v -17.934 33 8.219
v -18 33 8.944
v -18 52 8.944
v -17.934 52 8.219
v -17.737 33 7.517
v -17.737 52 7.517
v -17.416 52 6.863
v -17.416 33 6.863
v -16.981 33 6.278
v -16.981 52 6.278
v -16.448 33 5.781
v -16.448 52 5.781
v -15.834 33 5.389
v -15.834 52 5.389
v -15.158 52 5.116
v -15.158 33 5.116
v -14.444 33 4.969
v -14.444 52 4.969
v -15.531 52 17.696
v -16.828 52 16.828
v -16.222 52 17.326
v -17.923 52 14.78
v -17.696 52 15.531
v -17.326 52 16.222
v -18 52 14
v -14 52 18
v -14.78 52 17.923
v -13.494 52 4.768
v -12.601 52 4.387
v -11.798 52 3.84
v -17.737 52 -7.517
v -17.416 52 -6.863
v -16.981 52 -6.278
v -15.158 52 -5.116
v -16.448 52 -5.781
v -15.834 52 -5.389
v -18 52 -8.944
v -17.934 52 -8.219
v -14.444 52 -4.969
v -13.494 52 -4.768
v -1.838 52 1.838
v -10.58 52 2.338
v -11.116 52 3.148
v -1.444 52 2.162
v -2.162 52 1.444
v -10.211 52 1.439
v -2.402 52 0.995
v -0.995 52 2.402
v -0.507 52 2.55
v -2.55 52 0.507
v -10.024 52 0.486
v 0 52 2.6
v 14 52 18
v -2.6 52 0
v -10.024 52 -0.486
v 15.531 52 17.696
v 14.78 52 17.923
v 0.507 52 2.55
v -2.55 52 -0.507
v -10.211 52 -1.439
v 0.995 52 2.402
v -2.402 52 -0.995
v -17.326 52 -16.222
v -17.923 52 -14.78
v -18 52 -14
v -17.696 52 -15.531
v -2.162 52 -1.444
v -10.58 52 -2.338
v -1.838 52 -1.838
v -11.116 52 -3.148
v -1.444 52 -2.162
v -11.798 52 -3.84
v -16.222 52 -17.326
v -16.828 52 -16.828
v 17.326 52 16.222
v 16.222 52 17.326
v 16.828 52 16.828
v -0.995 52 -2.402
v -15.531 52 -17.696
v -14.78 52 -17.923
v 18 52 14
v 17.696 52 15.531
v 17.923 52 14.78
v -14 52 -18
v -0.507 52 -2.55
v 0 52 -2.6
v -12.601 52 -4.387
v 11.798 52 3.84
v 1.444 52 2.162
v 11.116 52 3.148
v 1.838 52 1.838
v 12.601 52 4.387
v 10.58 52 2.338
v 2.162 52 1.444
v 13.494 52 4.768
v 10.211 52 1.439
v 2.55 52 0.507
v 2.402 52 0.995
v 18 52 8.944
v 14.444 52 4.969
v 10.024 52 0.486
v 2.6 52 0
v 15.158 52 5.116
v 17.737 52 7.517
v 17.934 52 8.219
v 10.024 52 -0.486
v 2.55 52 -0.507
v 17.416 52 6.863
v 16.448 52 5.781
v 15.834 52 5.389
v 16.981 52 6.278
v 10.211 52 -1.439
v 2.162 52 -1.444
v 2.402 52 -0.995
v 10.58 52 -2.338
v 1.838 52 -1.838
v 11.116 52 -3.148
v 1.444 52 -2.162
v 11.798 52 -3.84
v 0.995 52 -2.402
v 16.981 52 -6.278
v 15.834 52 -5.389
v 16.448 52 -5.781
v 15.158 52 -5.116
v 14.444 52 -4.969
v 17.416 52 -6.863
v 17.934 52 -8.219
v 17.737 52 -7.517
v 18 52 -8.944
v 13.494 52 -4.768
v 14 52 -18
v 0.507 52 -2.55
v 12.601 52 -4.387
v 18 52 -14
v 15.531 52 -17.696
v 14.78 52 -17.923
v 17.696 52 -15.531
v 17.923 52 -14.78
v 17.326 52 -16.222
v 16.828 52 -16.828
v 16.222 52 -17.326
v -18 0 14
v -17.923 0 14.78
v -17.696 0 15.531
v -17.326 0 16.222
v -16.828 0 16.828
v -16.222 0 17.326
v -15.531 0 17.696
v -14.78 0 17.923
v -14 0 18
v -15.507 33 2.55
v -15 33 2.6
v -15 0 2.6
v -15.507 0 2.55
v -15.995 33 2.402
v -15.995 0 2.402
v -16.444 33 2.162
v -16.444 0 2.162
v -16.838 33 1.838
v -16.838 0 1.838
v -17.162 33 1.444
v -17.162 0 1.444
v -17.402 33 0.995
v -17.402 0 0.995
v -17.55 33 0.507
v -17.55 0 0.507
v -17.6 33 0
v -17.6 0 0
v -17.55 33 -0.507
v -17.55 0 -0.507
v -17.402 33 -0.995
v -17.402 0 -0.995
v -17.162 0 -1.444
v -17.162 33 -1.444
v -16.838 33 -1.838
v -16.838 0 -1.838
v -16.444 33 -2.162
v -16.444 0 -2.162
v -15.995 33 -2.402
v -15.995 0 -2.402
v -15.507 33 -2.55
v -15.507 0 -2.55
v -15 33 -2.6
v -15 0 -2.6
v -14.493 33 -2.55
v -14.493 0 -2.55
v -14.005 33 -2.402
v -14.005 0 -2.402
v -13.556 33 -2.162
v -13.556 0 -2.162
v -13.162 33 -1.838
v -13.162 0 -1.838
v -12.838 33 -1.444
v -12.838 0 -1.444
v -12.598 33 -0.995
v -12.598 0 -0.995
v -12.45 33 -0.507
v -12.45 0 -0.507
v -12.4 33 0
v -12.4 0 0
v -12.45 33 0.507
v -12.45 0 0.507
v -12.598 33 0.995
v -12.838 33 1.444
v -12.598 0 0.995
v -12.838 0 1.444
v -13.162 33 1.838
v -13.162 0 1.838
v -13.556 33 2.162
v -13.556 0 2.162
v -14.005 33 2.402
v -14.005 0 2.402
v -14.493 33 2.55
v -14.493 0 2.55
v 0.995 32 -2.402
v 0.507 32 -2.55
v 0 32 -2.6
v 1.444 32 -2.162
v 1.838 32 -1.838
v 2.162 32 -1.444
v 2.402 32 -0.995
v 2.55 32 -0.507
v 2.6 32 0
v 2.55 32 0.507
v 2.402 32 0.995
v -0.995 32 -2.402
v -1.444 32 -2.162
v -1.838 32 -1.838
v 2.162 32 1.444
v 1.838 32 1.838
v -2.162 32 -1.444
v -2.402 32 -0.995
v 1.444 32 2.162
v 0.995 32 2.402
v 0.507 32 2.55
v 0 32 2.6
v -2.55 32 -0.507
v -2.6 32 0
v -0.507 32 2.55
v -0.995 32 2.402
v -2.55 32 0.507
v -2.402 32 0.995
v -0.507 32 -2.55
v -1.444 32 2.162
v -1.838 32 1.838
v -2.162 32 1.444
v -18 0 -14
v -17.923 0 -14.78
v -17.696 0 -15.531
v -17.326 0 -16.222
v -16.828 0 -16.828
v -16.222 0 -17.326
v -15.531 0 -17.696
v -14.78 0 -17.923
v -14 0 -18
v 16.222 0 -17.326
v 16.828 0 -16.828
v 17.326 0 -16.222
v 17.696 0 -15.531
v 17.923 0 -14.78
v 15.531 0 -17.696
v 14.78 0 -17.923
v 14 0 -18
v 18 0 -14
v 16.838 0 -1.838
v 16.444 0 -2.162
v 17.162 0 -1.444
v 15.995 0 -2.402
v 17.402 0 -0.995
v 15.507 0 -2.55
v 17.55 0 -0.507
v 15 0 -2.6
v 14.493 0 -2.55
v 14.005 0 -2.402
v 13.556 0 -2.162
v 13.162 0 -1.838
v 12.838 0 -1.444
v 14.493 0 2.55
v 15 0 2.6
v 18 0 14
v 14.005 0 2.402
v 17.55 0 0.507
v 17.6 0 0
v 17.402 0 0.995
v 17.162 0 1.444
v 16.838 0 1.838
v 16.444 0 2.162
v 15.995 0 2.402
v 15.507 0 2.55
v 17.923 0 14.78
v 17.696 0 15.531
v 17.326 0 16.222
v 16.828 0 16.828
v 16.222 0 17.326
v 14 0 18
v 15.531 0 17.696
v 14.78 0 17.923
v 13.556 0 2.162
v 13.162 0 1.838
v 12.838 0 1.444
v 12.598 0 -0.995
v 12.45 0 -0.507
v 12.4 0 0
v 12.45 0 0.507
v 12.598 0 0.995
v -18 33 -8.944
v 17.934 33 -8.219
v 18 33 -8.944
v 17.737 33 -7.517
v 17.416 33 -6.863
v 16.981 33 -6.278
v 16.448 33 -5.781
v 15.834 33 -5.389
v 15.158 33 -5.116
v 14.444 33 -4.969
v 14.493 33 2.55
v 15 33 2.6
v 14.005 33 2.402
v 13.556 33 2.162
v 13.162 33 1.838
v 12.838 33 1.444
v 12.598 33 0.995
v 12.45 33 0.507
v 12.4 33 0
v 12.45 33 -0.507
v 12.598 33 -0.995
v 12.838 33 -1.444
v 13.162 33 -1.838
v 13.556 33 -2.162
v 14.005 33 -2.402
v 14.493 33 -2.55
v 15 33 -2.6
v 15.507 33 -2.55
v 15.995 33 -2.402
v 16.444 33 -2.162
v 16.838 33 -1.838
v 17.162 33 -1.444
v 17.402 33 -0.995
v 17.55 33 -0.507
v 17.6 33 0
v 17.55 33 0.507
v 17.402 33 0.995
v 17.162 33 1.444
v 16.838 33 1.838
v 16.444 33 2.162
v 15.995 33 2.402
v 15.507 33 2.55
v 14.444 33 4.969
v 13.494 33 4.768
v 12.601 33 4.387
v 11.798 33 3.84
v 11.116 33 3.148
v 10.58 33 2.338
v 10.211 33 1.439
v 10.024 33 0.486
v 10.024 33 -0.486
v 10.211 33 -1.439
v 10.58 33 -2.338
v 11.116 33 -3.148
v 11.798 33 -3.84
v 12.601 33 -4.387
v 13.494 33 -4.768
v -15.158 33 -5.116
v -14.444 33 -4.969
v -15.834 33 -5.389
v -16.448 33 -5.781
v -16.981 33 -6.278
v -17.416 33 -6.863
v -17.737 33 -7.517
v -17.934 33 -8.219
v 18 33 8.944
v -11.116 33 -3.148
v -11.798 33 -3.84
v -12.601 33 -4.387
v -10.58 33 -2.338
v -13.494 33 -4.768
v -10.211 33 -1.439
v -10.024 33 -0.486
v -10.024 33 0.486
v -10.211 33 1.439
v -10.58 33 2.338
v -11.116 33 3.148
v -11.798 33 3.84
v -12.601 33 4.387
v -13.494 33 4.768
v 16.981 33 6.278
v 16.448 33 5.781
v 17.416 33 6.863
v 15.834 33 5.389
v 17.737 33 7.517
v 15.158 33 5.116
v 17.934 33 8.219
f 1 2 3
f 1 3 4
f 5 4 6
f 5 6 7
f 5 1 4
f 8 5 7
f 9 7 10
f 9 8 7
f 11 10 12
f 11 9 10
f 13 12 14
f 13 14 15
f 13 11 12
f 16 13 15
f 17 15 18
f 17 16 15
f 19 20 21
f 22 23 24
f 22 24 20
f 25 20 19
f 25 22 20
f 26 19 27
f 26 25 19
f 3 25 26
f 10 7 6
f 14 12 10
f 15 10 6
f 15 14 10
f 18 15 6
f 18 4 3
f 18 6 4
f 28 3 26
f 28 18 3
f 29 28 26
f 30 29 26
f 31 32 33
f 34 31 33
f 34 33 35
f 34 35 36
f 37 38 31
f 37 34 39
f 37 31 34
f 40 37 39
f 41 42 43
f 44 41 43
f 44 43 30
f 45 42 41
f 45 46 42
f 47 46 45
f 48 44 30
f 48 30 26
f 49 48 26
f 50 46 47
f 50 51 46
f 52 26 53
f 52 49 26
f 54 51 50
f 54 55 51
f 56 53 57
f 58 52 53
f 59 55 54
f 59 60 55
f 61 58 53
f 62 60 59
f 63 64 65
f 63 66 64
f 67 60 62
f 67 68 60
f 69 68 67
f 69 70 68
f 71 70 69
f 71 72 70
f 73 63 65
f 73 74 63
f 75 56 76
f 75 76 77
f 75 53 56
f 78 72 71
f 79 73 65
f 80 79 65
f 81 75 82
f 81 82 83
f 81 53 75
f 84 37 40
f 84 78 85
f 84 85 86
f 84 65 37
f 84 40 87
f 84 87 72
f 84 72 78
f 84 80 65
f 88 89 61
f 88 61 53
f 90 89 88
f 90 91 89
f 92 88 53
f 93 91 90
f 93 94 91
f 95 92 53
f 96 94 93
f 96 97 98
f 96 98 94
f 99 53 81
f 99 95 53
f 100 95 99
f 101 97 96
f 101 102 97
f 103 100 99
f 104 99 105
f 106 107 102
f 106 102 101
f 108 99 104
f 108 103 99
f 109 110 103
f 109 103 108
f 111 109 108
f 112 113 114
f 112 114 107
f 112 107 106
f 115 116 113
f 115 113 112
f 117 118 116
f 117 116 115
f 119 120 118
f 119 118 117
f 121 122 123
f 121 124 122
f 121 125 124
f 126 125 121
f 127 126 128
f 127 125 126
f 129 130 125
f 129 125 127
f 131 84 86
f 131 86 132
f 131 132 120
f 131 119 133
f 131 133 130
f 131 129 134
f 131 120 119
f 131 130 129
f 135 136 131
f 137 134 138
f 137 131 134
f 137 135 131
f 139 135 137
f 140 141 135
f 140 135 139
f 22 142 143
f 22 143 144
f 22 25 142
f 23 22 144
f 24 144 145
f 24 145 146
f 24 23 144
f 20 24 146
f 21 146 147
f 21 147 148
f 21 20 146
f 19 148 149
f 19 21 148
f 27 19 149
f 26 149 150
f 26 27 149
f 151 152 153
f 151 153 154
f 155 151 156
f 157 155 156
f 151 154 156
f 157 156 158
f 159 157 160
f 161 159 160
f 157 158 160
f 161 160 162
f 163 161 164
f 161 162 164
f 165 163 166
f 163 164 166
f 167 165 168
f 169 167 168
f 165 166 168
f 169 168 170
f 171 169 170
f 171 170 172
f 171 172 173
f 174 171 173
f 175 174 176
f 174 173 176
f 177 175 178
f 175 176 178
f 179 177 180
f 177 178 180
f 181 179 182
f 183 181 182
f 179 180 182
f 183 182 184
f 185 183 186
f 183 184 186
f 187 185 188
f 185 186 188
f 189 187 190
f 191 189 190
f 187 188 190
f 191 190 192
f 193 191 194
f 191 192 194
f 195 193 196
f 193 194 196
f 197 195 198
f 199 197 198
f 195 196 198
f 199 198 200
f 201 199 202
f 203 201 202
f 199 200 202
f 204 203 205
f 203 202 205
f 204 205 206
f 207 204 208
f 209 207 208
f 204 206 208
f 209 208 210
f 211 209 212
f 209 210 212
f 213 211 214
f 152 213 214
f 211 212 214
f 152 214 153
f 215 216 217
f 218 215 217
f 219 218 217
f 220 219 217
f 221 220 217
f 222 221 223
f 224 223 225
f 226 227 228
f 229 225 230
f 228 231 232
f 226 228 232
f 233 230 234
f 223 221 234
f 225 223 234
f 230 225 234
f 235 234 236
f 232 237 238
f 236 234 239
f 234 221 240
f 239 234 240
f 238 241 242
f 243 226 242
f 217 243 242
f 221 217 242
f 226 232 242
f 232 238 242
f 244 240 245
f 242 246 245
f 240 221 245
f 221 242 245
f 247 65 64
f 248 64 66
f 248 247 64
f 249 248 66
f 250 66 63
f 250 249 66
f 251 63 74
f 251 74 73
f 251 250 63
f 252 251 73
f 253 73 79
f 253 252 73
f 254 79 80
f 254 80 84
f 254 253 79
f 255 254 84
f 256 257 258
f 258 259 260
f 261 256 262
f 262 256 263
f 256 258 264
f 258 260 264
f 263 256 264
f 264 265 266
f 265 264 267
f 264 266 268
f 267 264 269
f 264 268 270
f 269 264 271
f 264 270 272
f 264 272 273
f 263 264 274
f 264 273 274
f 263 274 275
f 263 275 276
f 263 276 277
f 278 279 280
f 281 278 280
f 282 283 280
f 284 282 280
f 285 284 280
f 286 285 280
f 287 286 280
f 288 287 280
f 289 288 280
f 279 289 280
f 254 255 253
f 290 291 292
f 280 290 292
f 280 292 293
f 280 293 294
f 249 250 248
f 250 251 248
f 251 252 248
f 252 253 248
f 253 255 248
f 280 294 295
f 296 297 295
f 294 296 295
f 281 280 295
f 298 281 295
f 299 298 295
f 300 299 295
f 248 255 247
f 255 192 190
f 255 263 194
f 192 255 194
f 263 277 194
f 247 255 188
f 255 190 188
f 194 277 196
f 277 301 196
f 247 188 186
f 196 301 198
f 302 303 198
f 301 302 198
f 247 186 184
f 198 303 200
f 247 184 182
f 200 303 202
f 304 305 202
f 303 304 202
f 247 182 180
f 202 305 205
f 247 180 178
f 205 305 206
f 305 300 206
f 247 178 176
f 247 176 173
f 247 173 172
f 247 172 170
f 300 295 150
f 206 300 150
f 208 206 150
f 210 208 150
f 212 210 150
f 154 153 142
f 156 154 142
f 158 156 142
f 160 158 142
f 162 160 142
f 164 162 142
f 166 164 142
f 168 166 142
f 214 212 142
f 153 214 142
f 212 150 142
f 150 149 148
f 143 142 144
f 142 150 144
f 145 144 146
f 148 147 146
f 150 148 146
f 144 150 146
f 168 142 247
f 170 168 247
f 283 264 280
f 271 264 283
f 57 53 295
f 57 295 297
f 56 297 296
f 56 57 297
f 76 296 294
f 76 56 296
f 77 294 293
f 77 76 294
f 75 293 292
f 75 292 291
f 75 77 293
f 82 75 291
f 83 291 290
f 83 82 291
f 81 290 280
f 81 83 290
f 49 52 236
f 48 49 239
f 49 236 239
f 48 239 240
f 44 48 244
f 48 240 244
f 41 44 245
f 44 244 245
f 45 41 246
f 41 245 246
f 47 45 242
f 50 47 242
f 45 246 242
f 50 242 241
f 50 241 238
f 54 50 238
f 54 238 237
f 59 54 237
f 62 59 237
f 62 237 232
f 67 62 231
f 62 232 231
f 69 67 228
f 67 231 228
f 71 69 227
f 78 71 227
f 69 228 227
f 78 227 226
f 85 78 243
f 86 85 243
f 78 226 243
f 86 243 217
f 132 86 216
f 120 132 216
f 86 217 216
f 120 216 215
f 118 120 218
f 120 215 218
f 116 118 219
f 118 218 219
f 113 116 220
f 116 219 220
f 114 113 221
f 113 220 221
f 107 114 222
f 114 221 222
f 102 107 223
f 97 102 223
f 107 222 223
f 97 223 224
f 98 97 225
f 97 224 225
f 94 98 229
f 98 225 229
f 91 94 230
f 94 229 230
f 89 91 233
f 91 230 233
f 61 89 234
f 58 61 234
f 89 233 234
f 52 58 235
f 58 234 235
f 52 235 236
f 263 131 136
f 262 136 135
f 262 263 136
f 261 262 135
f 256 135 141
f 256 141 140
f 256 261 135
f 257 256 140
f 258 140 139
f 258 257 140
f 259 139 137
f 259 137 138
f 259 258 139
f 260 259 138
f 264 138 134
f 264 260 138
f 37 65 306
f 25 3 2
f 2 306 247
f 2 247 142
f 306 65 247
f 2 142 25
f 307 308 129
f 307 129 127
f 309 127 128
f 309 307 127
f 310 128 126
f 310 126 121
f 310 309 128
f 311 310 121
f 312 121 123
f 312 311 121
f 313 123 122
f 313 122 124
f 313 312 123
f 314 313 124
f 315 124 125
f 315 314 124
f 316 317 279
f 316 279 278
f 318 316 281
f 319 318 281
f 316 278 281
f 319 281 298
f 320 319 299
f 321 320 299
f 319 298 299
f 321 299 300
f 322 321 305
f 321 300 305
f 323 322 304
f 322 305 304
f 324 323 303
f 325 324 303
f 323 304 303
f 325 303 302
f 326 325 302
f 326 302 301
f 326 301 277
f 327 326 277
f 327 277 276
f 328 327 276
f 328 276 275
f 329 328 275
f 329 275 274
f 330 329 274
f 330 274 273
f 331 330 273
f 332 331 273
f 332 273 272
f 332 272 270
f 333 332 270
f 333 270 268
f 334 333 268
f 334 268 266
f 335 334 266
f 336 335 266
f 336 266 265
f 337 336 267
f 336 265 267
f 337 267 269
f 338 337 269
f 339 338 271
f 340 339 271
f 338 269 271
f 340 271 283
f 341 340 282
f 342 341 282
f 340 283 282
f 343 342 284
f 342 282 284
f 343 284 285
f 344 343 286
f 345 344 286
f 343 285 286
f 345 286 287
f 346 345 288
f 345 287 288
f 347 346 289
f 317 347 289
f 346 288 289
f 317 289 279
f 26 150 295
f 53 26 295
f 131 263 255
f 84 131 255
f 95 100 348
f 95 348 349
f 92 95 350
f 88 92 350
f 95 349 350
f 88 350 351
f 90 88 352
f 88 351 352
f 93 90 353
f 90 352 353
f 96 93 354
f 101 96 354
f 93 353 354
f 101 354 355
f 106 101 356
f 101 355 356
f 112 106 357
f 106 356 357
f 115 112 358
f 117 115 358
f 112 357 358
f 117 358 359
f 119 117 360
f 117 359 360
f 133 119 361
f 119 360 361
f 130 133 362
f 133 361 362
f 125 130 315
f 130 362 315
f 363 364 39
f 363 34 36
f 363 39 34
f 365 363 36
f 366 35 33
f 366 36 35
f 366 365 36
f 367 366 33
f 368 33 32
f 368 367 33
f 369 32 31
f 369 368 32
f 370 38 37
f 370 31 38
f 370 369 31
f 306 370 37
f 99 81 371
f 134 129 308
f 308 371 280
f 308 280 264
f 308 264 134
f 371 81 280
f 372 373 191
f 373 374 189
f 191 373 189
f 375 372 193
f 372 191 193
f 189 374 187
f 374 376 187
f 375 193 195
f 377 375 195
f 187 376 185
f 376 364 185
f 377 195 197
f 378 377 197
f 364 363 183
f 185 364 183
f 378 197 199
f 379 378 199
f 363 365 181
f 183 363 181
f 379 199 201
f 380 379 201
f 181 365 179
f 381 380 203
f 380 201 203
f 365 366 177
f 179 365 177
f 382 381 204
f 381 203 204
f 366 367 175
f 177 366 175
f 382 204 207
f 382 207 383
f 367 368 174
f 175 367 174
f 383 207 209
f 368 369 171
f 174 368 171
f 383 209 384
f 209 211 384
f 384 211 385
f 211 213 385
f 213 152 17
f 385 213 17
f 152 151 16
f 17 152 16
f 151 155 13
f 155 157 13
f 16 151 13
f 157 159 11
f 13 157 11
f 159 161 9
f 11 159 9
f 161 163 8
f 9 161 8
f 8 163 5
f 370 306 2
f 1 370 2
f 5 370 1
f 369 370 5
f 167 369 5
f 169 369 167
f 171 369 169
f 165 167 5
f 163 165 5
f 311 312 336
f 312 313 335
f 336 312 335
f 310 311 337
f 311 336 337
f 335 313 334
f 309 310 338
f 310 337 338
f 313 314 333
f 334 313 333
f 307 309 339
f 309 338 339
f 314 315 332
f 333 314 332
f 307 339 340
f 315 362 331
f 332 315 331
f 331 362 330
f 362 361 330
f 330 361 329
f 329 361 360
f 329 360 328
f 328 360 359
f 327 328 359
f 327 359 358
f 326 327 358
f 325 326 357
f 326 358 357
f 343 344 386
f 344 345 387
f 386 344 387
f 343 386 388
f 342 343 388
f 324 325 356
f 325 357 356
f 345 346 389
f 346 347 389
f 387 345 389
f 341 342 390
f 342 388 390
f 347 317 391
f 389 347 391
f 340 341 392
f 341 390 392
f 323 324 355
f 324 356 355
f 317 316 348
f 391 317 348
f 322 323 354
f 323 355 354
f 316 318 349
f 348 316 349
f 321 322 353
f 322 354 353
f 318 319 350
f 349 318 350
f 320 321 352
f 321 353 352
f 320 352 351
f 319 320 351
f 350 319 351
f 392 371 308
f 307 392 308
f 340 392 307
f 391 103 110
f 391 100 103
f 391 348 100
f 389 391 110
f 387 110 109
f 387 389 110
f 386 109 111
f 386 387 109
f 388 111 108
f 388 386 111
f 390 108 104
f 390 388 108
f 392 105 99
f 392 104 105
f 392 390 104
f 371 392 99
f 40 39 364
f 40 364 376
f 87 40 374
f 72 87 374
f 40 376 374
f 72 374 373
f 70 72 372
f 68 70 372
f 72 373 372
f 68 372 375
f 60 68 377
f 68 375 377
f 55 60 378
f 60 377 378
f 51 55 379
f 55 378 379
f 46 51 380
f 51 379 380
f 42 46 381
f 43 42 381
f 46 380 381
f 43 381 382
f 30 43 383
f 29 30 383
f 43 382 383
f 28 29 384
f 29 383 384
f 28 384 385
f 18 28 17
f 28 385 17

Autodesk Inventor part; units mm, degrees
ref_plane "YZ Plane" through (0, 0, 0) normal (1, 0, 0) x (0, 1, 0)
ref_plane "XZ Plane" through (0, 0, 0) normal (0, 1, 0) x (-1, 0, 0)
ref_plane "XY Plane" through (0, 0, 0) normal (0, 0, 1) x (1, 0, 0)
sketch "Sketch1" plane through (0, 0, 0) normal (0, 1, 0) x (-1, 0, 0)
  line L0 (18, 18) -> (-18, 18)
  line L1 (-18, 18) -> (-18, -18)
  line L2 (-18, -18) -> (18, -18)
  line L3 (18, -18) -> (18, 18)
  line L4 (18, 18) -> (-18, -18) construction
  line L5 (-18, 18) -> (18, -18) construction
  point P0 (0, 0)
  dimension "d0" = 36
  dimension "d1" = 36
extrude "Extrusion1" add sketch "Sketch1" along normal blind 5
sketch "Sketch2" plane through (0, 5, 0) normal (0, 1, 0) x (1, 0, 0)
  line L0 (18, -18) -> (18, 18) projected
  line L1 (18, 18) -> (-18, 18) projected
  line L2 (-18, 18) -> (-18, -18) projected
  line L3 (-18, -18) -> (18, -18) projected
  line L4 (-18, -18) -> (18, -18)
  line L5 (18, -18) -> (18, 18)
  line L6 (18, 18) -> (-18, 18)
  line L7 (-18, 18) -> (-18, -18)
  line L8 (-18, -18) -> (18, 18) construction
  line L9 (18, -18) -> (-18, 18) construction
  point P0 (0, 0)
extrude "Extrusion2" add sketch "Sketch2" along normal blind 47
sketch "Sketch3" plane through (0, 52, 0) normal (0, 1, 0) x (1, 0, 0)
  line L0 (-15, 0) -> (15, 0) construction
  point P0 (0, 0)
  point P1 (0, 0)
  dimension "d6" = 30
hole "Hole1" at (-15, 52, 0) at (15, 52, 0) direction (0, -1, 0) diameter 5.2 end through all counterbore diameter 10 counterbore depth 19
fillet "Fillet1" radius 4 8 edges at (18, 26, 18) (-18, 26, 18) (18, 26, -18) (-18, 26, -18) (18, 42.5, -4) (18, 42.5, 4) (-18, 42.5, 4) (-18, 42.5, -4)
sketch "Sketch4" plane through (0, 52, 0) normal (0, 1, 0) x (1, 0, 0)
  point P0 (0, 0)
  point P1 (0, 0)
hole "Hole2" at (0, 52, 0) direction (0, -1, 0) diameter 5.2 depth 20
properties part number "LED Power Box (12V) Pillar" material "ABS Plastic"
